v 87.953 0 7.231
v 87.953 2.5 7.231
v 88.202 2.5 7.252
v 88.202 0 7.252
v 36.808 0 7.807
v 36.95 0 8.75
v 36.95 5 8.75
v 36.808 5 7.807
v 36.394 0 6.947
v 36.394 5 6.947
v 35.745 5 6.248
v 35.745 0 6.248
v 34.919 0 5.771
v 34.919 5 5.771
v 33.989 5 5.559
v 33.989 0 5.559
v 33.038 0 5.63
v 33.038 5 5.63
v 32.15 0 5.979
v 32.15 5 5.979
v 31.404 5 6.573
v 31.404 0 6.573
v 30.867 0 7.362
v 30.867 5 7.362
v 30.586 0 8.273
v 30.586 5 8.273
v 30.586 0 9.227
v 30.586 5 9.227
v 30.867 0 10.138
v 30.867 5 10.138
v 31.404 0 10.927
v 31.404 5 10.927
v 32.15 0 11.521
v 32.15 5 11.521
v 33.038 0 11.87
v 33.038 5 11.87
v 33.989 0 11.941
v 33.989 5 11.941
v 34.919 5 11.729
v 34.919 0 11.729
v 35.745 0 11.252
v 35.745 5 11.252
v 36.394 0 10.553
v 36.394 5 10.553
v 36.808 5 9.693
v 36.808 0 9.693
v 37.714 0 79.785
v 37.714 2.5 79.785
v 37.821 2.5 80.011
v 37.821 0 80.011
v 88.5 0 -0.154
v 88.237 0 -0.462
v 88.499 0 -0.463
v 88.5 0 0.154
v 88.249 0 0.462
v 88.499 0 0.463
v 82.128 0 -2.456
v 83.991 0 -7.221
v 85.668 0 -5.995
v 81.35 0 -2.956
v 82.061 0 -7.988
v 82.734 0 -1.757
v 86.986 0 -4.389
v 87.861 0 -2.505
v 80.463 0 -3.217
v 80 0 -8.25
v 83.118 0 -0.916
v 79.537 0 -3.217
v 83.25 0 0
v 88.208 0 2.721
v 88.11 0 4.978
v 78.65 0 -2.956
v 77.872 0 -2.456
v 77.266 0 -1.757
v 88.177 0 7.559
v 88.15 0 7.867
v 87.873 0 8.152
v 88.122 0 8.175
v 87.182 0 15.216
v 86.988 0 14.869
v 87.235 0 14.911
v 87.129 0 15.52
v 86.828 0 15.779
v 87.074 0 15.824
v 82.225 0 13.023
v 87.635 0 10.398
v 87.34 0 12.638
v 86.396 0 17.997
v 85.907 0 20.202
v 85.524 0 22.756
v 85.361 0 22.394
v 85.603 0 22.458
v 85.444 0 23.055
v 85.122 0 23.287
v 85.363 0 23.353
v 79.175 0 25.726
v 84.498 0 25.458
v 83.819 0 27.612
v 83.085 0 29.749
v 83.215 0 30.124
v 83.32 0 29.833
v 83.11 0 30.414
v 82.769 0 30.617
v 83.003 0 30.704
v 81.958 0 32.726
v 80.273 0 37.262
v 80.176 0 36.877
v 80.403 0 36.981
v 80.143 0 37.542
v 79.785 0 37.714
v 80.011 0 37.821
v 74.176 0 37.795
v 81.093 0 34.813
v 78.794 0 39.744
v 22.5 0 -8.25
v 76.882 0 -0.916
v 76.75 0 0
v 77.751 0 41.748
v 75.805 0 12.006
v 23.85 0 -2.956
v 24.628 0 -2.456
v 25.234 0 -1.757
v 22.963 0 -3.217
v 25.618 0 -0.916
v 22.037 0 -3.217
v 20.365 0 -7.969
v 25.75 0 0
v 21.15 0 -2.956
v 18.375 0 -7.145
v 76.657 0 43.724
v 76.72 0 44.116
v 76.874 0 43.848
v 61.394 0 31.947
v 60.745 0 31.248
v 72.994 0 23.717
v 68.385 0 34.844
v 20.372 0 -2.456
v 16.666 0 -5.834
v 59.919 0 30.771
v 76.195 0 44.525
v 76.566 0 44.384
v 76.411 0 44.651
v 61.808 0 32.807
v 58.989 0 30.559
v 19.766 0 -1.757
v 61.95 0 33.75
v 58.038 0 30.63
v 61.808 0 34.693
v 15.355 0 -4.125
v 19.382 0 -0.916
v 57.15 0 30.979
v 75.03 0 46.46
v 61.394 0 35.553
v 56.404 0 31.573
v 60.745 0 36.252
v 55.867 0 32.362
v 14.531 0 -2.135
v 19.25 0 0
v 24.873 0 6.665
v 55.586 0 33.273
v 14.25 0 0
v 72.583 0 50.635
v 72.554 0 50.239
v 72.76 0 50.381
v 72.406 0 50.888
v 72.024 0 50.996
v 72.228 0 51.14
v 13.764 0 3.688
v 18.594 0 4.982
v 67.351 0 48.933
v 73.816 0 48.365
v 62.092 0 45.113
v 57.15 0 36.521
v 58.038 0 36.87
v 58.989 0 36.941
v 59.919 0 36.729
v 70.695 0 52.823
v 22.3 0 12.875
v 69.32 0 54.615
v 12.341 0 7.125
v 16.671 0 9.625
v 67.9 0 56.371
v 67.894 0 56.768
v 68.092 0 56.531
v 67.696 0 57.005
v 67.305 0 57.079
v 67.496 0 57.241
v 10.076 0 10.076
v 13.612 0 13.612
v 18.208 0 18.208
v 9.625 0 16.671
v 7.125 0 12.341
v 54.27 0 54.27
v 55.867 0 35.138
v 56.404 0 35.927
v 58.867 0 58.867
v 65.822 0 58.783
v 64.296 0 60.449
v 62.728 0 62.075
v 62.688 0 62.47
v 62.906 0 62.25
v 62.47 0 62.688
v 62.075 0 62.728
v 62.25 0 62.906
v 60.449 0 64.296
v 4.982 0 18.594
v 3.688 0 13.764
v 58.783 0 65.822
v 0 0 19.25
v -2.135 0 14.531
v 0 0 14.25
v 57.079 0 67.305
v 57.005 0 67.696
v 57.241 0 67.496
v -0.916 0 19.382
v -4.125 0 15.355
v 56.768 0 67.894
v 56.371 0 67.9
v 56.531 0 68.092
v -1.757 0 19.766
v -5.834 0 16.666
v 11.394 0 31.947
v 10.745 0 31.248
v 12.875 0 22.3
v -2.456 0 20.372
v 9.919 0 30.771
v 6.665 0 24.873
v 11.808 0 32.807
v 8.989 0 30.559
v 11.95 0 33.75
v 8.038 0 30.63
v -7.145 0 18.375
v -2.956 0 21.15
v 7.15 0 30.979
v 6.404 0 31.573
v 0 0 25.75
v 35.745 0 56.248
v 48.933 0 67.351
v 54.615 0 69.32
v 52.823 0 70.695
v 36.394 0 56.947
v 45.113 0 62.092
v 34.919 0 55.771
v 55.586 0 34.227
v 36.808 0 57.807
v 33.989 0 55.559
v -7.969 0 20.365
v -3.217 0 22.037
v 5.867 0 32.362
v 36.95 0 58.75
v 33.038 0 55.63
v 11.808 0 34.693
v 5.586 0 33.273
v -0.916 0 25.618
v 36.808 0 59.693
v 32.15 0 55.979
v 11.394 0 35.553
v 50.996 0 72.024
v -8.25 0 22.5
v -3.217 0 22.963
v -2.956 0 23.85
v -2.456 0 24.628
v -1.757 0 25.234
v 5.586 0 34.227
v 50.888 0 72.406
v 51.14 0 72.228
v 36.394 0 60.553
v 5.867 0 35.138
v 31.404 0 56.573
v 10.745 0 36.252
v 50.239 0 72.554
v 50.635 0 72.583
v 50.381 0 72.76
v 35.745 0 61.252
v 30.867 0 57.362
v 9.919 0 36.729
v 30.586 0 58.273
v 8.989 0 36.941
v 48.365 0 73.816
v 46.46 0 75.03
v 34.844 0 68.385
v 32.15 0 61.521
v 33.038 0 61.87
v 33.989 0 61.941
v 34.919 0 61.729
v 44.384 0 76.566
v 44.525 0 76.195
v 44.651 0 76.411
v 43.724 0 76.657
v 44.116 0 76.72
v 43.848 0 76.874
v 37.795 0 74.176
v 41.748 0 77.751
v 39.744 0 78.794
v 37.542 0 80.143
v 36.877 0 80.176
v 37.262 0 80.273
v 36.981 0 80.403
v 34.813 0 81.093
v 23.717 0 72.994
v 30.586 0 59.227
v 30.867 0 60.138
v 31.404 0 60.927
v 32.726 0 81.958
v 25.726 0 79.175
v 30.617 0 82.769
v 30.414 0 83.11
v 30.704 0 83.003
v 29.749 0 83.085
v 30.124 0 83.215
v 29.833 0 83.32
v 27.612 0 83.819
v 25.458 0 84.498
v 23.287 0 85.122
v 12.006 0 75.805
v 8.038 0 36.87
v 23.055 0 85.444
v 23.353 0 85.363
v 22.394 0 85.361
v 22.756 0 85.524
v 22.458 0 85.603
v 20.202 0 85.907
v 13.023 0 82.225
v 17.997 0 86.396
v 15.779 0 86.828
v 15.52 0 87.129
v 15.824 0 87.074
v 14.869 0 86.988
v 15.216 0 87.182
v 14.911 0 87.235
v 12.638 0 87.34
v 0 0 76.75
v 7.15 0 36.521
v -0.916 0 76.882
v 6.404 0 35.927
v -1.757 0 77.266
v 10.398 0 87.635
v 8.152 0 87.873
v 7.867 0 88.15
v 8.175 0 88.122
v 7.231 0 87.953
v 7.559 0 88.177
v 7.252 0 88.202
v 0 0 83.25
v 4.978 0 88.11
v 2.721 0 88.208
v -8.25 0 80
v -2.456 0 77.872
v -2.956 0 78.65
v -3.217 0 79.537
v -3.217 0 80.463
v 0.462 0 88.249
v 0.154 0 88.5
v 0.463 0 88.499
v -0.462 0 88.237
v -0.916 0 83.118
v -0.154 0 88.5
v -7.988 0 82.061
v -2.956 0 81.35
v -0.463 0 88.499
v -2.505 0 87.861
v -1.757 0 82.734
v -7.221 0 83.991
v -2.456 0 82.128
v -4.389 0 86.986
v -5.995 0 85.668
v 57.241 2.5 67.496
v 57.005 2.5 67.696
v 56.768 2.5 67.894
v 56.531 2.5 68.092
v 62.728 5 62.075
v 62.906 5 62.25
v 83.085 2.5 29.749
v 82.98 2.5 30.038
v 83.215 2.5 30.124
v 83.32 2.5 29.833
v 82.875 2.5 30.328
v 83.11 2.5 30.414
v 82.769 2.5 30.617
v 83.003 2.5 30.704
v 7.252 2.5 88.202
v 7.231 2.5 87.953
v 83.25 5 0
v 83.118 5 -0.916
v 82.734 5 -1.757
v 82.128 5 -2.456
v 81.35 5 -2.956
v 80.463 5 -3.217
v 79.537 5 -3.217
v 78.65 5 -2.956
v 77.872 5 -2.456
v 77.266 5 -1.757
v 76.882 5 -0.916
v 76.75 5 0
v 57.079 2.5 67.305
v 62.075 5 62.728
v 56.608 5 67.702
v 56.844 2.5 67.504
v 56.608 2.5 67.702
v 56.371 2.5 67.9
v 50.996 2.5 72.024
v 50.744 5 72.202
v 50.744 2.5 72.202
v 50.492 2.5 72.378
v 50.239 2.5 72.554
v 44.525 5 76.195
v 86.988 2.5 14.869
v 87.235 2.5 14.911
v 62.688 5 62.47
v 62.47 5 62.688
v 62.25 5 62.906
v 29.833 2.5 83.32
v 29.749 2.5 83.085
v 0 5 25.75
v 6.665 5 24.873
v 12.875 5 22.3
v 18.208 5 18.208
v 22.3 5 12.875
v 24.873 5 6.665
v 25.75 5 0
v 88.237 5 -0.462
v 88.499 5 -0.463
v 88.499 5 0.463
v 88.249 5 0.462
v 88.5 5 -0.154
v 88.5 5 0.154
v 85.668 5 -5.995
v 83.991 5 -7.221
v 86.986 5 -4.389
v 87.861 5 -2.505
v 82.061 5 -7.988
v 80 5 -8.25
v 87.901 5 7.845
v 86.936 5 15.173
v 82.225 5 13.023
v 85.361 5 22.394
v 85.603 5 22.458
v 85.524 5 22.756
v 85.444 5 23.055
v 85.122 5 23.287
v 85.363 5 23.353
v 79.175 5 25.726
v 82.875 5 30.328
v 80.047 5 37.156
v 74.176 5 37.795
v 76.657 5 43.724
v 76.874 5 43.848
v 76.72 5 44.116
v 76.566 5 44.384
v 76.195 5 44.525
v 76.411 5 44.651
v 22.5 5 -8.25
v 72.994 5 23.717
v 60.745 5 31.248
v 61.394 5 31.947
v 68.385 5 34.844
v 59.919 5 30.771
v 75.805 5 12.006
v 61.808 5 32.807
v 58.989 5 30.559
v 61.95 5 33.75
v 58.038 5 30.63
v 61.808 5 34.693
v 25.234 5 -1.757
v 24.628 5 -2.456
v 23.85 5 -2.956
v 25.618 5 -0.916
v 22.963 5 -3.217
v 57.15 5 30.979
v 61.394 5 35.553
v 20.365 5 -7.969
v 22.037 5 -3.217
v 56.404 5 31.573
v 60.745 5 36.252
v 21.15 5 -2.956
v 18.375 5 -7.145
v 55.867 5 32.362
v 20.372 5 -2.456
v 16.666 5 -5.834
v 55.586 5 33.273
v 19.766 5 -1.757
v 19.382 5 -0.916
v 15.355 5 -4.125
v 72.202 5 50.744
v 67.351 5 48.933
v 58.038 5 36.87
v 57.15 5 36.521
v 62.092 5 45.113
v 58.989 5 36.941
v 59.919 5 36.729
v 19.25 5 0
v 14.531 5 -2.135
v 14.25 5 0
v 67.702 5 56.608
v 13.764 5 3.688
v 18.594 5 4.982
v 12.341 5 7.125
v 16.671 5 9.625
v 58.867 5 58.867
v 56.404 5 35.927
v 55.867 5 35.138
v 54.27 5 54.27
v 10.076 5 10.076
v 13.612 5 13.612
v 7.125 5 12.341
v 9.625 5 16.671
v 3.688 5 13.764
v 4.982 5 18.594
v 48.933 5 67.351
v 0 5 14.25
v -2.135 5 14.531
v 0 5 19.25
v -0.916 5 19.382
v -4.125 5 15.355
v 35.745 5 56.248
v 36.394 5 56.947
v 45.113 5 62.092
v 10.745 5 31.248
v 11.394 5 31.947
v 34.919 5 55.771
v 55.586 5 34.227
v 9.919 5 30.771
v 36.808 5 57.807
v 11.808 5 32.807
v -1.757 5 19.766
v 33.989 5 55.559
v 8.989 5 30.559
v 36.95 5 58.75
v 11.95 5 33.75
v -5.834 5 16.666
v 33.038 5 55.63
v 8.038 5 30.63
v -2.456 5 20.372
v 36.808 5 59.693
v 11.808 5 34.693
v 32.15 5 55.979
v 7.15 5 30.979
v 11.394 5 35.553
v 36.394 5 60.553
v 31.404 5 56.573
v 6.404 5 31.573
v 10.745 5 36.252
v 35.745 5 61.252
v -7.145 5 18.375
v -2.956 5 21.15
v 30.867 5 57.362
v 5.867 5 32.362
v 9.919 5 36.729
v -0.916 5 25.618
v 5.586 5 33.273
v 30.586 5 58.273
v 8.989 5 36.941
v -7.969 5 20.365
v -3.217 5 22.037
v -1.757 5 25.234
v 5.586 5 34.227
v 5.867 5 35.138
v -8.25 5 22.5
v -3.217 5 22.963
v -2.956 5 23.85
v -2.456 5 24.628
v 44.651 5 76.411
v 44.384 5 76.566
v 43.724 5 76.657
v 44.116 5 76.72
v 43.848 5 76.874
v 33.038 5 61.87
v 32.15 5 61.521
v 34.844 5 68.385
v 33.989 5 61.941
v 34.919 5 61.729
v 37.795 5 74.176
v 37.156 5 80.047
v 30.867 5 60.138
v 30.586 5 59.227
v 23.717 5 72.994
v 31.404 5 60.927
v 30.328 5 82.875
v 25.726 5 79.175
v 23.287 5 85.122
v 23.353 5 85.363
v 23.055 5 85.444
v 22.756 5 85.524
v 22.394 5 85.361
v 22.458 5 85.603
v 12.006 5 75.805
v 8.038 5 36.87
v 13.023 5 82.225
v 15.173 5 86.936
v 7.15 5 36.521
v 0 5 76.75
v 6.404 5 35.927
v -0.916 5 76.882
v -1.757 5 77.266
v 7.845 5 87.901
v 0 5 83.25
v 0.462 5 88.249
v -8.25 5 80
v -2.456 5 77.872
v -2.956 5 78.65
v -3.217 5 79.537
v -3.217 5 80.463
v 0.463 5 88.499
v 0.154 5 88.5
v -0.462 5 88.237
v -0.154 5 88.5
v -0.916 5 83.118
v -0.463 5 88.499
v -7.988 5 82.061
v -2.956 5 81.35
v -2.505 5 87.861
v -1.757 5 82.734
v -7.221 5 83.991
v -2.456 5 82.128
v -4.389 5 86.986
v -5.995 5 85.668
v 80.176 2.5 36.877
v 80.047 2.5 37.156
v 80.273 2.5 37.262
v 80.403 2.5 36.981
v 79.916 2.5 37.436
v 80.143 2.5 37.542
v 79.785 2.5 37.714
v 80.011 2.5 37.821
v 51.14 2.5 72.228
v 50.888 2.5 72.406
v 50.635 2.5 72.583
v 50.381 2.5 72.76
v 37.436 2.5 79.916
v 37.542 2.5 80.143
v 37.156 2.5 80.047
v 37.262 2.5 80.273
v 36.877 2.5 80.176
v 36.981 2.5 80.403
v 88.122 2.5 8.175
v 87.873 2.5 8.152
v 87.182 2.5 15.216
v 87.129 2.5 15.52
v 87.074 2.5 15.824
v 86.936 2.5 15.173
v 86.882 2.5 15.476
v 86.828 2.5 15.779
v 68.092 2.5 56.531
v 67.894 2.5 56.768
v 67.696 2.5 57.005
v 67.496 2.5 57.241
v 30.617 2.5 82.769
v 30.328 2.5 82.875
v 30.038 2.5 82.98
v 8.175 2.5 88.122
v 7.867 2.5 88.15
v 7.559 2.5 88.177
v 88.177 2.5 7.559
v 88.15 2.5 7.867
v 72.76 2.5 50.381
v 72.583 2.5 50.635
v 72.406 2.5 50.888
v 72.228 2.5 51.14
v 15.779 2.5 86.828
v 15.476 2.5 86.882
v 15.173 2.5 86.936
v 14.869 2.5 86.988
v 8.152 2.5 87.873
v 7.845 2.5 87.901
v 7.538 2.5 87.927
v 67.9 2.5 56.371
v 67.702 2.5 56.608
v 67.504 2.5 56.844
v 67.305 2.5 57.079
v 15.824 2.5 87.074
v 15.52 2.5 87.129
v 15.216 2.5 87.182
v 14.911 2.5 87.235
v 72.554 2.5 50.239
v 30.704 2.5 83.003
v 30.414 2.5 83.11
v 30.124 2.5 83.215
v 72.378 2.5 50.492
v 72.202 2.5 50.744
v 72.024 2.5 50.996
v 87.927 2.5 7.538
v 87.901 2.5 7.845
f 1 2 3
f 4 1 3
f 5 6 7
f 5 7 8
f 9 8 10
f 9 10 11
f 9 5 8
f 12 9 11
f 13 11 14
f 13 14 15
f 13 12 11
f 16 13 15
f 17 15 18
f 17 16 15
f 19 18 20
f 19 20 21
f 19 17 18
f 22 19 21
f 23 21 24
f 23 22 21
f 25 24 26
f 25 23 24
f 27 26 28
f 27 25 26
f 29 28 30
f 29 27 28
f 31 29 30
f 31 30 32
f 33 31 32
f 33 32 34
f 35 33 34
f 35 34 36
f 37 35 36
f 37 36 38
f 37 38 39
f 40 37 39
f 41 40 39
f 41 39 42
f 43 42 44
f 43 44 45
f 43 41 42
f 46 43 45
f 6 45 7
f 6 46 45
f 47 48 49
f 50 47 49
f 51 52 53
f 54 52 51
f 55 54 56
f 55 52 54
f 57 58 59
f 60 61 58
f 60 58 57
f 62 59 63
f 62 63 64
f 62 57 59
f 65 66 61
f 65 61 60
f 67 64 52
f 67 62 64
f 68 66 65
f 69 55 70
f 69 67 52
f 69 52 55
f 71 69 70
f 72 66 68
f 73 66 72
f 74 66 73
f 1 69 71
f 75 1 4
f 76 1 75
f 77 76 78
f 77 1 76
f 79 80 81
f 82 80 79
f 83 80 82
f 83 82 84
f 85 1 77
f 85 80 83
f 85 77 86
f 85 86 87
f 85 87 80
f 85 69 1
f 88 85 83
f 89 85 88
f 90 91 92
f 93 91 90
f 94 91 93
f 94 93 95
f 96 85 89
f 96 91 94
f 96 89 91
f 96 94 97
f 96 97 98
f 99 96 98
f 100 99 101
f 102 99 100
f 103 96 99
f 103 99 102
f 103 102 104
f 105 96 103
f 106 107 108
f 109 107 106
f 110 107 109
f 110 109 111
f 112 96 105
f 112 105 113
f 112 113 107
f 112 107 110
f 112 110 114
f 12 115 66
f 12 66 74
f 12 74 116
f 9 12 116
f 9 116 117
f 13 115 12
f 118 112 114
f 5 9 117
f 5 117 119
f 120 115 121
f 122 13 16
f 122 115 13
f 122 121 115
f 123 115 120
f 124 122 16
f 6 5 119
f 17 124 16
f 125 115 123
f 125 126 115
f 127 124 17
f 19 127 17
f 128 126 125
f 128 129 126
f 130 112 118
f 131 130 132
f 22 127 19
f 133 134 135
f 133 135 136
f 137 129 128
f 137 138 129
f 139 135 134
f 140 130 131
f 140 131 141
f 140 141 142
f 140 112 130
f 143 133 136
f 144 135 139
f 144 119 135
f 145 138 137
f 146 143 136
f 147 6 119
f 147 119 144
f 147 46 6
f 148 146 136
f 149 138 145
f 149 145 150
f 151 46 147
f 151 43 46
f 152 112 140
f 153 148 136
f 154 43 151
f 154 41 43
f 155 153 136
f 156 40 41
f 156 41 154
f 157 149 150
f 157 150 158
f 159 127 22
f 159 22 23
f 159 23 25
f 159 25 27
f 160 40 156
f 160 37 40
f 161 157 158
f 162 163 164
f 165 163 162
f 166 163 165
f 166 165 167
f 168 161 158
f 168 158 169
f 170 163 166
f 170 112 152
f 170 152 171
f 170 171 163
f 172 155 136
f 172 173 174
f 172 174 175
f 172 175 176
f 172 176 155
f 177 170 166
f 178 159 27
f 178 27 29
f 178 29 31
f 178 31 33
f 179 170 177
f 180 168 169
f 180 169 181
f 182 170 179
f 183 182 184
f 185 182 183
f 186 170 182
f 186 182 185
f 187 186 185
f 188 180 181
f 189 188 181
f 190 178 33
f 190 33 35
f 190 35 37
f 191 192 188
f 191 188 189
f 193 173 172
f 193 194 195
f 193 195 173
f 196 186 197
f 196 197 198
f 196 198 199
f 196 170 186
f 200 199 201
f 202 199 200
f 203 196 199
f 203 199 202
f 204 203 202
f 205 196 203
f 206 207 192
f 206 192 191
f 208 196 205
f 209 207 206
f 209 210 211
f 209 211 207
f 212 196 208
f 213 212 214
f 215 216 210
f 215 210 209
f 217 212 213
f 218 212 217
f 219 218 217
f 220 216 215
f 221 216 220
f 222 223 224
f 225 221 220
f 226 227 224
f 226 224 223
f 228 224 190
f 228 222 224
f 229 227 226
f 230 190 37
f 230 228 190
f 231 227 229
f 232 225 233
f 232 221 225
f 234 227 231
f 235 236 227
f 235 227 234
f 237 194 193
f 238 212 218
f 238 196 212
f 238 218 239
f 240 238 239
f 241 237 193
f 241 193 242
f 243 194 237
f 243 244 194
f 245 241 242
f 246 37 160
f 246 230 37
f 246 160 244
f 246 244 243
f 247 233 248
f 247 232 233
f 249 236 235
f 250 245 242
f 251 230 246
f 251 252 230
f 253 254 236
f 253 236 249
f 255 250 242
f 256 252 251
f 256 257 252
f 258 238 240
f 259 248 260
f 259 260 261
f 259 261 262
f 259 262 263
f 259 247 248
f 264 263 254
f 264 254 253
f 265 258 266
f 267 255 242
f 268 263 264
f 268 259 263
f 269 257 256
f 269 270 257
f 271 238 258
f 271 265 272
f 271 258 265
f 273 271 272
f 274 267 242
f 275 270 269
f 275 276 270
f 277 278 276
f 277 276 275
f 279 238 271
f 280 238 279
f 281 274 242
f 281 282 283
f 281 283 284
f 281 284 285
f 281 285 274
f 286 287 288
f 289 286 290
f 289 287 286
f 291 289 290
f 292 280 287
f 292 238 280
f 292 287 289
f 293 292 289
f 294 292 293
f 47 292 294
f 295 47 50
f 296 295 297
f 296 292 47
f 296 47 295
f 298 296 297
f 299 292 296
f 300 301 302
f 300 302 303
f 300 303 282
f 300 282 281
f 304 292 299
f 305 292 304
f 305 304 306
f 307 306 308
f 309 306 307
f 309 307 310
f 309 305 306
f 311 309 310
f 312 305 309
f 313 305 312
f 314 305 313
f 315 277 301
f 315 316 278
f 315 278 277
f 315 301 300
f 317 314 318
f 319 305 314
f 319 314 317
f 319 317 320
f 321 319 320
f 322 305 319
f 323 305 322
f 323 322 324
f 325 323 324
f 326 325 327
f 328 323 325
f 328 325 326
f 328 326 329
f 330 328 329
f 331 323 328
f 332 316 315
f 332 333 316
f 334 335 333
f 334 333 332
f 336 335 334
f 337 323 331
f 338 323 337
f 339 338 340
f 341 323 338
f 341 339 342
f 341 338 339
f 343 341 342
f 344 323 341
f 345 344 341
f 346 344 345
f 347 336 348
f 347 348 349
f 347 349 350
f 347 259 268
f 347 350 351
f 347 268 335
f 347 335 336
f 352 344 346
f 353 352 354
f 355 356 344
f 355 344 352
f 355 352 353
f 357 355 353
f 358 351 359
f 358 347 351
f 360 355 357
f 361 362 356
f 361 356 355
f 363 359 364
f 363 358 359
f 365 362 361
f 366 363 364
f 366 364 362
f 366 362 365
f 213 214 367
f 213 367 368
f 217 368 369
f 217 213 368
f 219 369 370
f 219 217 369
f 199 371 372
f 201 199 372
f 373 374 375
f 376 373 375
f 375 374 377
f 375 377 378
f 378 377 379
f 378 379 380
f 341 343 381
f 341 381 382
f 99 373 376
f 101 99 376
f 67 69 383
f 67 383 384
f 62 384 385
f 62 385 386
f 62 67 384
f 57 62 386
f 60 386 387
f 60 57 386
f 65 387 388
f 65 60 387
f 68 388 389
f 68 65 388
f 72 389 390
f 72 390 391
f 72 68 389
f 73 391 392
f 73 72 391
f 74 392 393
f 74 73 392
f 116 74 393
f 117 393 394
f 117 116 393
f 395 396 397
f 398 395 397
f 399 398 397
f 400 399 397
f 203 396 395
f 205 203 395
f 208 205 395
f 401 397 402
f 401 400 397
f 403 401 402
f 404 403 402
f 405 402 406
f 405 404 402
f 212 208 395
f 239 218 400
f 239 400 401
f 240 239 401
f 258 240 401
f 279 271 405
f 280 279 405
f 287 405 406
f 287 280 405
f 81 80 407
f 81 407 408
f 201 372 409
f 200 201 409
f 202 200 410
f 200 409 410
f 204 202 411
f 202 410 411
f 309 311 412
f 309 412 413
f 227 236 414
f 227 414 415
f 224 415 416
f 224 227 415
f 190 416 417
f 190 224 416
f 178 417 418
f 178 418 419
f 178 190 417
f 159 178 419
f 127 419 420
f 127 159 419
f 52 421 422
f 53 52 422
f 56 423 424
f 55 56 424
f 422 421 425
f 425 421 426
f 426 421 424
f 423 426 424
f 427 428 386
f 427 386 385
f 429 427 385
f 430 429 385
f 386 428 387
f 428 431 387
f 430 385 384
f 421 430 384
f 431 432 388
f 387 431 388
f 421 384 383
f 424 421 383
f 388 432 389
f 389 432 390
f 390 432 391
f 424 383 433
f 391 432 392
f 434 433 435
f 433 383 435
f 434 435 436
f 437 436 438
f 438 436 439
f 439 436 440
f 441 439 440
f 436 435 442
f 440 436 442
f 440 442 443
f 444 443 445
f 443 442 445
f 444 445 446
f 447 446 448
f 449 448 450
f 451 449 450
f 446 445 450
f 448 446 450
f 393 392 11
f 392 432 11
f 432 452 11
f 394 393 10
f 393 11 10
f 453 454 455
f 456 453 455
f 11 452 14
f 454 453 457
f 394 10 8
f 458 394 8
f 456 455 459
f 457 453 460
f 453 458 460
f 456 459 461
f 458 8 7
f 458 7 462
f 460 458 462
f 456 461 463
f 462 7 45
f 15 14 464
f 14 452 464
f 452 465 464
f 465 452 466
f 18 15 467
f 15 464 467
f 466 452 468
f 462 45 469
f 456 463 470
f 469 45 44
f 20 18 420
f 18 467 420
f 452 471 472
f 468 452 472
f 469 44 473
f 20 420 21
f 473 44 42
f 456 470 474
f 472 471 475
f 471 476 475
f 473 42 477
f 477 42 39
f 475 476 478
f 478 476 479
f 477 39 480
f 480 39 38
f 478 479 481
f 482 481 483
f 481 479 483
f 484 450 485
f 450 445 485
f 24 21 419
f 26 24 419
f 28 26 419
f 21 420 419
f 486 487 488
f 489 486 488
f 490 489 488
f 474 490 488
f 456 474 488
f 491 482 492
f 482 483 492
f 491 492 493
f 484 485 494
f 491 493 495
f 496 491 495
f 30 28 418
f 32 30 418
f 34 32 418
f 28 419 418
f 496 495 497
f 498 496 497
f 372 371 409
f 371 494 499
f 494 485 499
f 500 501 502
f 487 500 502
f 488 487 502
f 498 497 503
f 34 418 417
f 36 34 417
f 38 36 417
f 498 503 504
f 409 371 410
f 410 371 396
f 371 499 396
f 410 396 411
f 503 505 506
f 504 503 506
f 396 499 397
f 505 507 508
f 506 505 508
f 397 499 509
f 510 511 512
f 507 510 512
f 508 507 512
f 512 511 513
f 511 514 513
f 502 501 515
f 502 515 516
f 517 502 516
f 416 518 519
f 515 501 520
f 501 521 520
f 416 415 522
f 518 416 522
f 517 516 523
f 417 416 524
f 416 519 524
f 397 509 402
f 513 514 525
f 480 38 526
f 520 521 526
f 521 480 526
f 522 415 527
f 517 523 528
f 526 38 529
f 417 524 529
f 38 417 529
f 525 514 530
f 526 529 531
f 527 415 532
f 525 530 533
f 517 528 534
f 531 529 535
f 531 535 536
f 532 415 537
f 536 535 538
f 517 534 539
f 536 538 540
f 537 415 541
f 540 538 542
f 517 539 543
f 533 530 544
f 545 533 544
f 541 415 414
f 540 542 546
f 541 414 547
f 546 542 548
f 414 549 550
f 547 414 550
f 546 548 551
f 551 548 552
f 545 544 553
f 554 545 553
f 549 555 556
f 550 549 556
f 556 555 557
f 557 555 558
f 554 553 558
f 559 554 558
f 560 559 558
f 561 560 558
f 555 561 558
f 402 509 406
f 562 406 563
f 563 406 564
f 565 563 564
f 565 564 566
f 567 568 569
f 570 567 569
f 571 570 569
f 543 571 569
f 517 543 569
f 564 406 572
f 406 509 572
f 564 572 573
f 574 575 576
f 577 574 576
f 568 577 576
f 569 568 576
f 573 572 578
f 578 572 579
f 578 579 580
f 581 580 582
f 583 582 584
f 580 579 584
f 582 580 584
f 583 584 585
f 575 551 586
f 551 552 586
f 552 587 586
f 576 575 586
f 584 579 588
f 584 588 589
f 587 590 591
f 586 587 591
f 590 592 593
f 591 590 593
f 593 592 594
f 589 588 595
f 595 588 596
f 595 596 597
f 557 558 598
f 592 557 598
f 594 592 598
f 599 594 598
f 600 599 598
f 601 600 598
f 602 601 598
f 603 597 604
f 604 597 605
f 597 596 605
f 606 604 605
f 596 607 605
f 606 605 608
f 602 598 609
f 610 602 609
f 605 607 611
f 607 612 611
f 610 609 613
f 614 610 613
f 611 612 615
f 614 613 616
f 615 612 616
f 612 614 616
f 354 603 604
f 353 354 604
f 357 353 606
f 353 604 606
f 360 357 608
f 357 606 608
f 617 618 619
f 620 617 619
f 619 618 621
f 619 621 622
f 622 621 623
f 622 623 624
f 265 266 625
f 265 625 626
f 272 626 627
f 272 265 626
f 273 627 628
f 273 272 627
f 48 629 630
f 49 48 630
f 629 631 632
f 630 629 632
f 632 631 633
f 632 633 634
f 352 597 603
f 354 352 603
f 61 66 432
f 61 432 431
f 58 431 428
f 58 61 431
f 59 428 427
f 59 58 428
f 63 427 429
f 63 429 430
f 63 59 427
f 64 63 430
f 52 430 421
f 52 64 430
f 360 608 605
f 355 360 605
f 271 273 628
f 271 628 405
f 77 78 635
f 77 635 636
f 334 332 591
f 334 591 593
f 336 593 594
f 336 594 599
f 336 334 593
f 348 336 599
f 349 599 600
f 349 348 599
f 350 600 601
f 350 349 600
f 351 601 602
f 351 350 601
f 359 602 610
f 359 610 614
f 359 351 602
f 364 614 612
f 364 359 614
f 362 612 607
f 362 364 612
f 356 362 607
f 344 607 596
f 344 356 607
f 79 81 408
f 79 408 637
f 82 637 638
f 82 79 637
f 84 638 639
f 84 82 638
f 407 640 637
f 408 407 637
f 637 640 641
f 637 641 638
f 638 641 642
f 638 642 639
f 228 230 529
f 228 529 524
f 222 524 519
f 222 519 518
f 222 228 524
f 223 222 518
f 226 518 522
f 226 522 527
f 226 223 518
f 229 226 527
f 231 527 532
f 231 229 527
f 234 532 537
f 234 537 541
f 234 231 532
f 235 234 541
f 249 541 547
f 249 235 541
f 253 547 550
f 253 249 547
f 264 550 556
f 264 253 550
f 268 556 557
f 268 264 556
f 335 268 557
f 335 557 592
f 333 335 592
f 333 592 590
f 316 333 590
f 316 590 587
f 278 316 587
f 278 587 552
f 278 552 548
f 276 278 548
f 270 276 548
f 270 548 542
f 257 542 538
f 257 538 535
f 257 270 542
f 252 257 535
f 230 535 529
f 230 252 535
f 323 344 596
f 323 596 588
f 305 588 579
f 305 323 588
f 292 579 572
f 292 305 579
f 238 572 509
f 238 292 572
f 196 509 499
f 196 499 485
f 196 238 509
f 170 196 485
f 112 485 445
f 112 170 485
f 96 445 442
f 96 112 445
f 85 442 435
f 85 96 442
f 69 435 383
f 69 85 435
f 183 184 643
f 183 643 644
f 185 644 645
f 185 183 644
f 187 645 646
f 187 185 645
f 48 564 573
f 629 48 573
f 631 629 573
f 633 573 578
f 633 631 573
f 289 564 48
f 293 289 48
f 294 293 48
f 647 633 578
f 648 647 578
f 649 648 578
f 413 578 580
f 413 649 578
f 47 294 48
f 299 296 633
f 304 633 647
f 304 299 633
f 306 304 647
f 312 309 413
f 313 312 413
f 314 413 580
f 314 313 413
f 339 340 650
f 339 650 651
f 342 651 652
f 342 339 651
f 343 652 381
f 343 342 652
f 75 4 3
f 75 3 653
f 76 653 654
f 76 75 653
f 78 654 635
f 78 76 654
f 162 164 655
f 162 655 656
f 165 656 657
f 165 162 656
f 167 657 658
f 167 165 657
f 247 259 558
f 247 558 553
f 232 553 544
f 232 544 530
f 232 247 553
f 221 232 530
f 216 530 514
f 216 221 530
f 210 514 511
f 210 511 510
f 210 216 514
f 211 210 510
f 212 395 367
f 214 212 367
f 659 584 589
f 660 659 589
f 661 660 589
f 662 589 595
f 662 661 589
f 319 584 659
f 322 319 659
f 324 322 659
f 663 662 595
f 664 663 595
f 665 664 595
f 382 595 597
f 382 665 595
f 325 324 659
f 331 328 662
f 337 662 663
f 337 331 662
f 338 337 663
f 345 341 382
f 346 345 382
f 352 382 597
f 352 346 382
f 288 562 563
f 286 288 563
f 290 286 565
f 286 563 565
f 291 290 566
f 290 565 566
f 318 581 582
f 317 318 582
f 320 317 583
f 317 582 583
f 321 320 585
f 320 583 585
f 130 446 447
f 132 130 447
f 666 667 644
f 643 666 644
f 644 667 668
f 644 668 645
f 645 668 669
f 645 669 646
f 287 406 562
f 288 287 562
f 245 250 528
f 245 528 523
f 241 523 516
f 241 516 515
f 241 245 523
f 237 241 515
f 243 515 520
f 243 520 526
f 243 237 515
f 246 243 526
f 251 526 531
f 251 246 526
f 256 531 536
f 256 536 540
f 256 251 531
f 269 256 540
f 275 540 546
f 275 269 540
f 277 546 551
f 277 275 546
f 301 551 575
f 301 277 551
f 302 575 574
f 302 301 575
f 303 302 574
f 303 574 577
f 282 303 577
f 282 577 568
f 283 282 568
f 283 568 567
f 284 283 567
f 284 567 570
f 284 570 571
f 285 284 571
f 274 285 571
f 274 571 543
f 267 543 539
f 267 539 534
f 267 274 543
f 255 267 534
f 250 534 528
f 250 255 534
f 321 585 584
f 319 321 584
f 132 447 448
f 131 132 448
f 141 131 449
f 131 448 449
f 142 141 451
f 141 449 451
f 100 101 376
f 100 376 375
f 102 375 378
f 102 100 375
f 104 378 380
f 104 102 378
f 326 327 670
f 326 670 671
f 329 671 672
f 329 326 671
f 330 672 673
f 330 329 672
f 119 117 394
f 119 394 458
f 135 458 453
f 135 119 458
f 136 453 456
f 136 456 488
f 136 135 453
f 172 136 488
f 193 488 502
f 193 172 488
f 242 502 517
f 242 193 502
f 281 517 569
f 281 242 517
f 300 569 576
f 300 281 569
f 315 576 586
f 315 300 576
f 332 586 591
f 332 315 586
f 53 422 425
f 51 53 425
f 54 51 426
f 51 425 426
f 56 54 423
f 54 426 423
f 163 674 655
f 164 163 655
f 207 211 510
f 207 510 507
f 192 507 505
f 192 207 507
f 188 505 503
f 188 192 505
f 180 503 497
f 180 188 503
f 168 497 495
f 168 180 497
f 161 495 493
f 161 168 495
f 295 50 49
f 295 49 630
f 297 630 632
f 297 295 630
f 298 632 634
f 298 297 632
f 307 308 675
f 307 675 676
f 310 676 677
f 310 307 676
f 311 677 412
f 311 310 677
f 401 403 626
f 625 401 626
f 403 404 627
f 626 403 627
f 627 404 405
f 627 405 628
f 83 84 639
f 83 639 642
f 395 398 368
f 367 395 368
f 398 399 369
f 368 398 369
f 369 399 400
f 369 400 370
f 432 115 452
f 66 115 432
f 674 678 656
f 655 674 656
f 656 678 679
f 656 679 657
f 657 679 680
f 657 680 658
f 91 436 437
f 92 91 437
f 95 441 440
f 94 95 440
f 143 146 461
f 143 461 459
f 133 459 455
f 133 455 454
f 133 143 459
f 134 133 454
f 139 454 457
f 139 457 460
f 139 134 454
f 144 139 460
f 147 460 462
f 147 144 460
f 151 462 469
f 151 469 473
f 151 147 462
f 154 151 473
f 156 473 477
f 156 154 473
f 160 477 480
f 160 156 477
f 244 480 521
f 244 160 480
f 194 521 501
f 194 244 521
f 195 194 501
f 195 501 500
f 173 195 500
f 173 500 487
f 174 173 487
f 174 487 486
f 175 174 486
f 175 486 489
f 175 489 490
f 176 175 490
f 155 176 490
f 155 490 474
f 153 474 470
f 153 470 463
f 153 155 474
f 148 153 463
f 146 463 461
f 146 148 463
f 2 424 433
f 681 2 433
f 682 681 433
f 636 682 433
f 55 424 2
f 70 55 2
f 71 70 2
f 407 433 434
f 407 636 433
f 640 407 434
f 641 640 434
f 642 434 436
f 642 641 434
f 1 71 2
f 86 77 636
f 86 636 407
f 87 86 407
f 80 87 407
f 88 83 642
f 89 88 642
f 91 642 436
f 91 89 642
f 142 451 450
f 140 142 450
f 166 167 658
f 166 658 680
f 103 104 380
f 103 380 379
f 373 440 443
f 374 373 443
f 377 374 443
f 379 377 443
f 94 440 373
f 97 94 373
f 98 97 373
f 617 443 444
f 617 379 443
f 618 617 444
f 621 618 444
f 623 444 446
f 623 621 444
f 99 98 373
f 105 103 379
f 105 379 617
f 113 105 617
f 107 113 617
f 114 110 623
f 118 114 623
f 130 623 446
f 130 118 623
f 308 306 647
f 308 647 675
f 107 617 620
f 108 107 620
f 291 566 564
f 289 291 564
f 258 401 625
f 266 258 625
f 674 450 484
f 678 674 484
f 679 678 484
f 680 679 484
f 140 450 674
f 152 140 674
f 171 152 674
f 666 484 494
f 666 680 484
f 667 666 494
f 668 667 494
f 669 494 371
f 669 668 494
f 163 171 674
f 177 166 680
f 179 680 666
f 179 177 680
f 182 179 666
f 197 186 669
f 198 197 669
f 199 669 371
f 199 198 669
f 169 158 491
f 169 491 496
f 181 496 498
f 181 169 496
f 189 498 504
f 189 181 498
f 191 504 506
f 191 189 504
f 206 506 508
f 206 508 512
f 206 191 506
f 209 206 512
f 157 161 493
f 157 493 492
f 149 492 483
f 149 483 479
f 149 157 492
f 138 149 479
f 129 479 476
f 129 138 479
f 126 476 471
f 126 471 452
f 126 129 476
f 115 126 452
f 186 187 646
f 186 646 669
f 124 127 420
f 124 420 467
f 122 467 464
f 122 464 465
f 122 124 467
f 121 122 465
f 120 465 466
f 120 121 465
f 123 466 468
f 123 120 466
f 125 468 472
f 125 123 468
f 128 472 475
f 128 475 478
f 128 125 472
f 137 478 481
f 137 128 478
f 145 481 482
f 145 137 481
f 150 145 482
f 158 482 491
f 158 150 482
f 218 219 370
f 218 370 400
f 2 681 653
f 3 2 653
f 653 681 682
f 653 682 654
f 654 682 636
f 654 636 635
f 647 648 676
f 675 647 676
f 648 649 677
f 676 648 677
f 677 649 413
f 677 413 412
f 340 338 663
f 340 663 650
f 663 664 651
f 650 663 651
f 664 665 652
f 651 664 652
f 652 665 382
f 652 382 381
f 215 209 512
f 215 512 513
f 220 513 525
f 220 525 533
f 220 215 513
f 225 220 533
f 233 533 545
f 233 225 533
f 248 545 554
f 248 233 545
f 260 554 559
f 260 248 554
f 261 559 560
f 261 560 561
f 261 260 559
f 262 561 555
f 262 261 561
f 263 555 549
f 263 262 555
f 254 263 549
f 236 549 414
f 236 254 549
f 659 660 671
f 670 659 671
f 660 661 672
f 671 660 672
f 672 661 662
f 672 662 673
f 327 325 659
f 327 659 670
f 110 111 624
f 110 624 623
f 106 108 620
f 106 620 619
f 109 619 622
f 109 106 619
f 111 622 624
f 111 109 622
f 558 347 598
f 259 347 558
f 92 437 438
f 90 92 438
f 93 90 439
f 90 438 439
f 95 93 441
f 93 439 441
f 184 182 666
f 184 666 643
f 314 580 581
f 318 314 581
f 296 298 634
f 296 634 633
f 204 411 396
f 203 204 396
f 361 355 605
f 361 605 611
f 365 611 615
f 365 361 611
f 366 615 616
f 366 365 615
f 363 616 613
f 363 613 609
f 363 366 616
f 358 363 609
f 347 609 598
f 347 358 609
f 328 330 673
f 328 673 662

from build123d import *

# Parameters (mm, degrees)
SKETCH_1_R               = 3.2
EXTRUDE_1_DEPTH          = 5
EXTRUDE_2_DEPTH          = 5
PATTERN_CIRCULAR_1_COUNT = 7
PATTERN_CIRCULAR_1_ANGLE = 90
EXTRUDE_3_DEPTH          = 2.5
PATTERN_CIRCULAR_2_COUNT = 19
PATTERN_CIRCULAR_2_ANGLE = 90


with BuildPart() as part:
    # 스케치1 → 보스-돌출1 (new body)
    with BuildSketch(Plane(origin=(0, 0, 0), x_dir=(1, 0, 0), z_dir=(0, 1, 0))):
        with BuildLine():
            Line((-8.25, -80), (-8.25, -22.5))
            ThreePointArc((-8.25, -22.5), (-5.833630945, -16.666369055), (0, -14.25))
            ThreePointArc((0, -14.25), (10.076271632, -10.076271632), (14.25, 0))
            ThreePointArc((14.25, 0), (16.666369055, 5.833630945), (22.5, 8.25))
            Line((22.5, 8.25), (80, 8.25))
            ThreePointArc((80, 8.25), (85.833630945, 5.833630945), (88.25, 0))
            ThreePointArc((88.25, 0), (62.40217344, -62.40217344), (0, -88.25))
            ThreePointArc((0, -88.25), (-5.833630945, -85.833630945), (-8.25, -80))
        make_face()
        with Locations((58.75, -33.75)):
            Circle(SKETCH_1_R, mode=Mode.SUBTRACT)
        with Locations((33.75, -58.75)):
            Circle(SKETCH_1_R, mode=Mode.SUBTRACT)
        with Locations((8.75, -33.75)):
            Circle(SKETCH_1_R, mode=Mode.SUBTRACT)
        with Locations((33.75, -8.75)):
            Circle(SKETCH_1_R, mode=Mode.SUBTRACT)
        with BuildLine():
            ThreePointArc((0, -19.25), (-3.25, -22.5), (0, -25.75))
            ThreePointArc((0, -25.75), (18.207999616, -18.207999616), (25.75, 0))
            ThreePointArc((25.75, 0), (22.5, 3.25), (19.25, 0))
            ThreePointArc((19.25, 0), (13.611805538, -13.611805538), (0, -19.25))
        make_face(mode=Mode.SUBTRACT)
        with BuildLine():
            ThreePointArc((0, -76.75), (-3.25, -80), (0, -83.25))
            ThreePointArc((0, -83.25), (58.866639534, -58.866639534), (83.25, 0))
            ThreePointArc((83.25, 0), (80, 3.25), (76.75, 0))
            ThreePointArc((76.75, 0), (54.270445456, -54.270445456), (0, -76.75))
        make_face(mode=Mode.SUBTRACT)
    extrude(amount=EXTRUDE_1_DEPTH)

    # 스케치2 → 보스-돌출2 (add)
    with BuildSketch(Plane(origin=(0, 5, 0), x_dir=(1, 0, 0), z_dir=(0, 1, 0))):
        with BuildLine():
            Line((0.458146835, -87.498800572), (0.463382799, -88.498786864))
            ThreePointArc((0.463382799, -88.498786864), (0, -88.5), (-0.463382799, -88.498786864))
            Line((-0.463382799, -88.498786864), (-0.458146835, -87.498800572))
            ThreePointArc((-0.458146835, -87.498800572), (0, -87.5), (0.458146835, -87.498800572))
        make_face()
    extrude_2 = extrude(amount=-EXTRUDE_2_DEPTH)

    # 원형 패턴1: 보스-돌출2 ×7 about axis
    pattern_circular_1_axis = Axis((0, 0, 0), (0, 1, 0))
    for i in range(1, PATTERN_CIRCULAR_1_COUNT):
        add(extrude_2.rotate(pattern_circular_1_axis, i * PATTERN_CIRCULAR_1_ANGLE / (PATTERN_CIRCULAR_1_COUNT - 1)))

    # 스케치6 → 보스-돌출3 (add)
    with BuildSketch(Plane.XZ):
        with BuildLine():
            Line((88.498786864, 0.463382799), (87.998793718, 0.460764817))
            ThreePointArc((87.998793718, 0.460764817), (88, 0), (87.998793718, -0.460764817))
            Line((87.998793718, -0.460764817), (88.498786864, -0.463382799))
            ThreePointArc((88.498786864, -0.463382799), (88.5, 0), (88.498786864, 0.463382799))
        make_face()
    extrude_3 = extrude(amount=-EXTRUDE_3_DEPTH)

    # 원형 패턴2: 보스-돌출3 ×19 about axis
    pattern_circular_2_axis = Axis((0, 5, 0), (0, -1, 0))
    for i in range(1, PATTERN_CIRCULAR_2_COUNT):
        add(extrude_3.rotate(pattern_circular_2_axis, i * PATTERN_CIRCULAR_2_ANGLE / (PATTERN_CIRCULAR_2_COUNT - 1)))


solid = part.part
